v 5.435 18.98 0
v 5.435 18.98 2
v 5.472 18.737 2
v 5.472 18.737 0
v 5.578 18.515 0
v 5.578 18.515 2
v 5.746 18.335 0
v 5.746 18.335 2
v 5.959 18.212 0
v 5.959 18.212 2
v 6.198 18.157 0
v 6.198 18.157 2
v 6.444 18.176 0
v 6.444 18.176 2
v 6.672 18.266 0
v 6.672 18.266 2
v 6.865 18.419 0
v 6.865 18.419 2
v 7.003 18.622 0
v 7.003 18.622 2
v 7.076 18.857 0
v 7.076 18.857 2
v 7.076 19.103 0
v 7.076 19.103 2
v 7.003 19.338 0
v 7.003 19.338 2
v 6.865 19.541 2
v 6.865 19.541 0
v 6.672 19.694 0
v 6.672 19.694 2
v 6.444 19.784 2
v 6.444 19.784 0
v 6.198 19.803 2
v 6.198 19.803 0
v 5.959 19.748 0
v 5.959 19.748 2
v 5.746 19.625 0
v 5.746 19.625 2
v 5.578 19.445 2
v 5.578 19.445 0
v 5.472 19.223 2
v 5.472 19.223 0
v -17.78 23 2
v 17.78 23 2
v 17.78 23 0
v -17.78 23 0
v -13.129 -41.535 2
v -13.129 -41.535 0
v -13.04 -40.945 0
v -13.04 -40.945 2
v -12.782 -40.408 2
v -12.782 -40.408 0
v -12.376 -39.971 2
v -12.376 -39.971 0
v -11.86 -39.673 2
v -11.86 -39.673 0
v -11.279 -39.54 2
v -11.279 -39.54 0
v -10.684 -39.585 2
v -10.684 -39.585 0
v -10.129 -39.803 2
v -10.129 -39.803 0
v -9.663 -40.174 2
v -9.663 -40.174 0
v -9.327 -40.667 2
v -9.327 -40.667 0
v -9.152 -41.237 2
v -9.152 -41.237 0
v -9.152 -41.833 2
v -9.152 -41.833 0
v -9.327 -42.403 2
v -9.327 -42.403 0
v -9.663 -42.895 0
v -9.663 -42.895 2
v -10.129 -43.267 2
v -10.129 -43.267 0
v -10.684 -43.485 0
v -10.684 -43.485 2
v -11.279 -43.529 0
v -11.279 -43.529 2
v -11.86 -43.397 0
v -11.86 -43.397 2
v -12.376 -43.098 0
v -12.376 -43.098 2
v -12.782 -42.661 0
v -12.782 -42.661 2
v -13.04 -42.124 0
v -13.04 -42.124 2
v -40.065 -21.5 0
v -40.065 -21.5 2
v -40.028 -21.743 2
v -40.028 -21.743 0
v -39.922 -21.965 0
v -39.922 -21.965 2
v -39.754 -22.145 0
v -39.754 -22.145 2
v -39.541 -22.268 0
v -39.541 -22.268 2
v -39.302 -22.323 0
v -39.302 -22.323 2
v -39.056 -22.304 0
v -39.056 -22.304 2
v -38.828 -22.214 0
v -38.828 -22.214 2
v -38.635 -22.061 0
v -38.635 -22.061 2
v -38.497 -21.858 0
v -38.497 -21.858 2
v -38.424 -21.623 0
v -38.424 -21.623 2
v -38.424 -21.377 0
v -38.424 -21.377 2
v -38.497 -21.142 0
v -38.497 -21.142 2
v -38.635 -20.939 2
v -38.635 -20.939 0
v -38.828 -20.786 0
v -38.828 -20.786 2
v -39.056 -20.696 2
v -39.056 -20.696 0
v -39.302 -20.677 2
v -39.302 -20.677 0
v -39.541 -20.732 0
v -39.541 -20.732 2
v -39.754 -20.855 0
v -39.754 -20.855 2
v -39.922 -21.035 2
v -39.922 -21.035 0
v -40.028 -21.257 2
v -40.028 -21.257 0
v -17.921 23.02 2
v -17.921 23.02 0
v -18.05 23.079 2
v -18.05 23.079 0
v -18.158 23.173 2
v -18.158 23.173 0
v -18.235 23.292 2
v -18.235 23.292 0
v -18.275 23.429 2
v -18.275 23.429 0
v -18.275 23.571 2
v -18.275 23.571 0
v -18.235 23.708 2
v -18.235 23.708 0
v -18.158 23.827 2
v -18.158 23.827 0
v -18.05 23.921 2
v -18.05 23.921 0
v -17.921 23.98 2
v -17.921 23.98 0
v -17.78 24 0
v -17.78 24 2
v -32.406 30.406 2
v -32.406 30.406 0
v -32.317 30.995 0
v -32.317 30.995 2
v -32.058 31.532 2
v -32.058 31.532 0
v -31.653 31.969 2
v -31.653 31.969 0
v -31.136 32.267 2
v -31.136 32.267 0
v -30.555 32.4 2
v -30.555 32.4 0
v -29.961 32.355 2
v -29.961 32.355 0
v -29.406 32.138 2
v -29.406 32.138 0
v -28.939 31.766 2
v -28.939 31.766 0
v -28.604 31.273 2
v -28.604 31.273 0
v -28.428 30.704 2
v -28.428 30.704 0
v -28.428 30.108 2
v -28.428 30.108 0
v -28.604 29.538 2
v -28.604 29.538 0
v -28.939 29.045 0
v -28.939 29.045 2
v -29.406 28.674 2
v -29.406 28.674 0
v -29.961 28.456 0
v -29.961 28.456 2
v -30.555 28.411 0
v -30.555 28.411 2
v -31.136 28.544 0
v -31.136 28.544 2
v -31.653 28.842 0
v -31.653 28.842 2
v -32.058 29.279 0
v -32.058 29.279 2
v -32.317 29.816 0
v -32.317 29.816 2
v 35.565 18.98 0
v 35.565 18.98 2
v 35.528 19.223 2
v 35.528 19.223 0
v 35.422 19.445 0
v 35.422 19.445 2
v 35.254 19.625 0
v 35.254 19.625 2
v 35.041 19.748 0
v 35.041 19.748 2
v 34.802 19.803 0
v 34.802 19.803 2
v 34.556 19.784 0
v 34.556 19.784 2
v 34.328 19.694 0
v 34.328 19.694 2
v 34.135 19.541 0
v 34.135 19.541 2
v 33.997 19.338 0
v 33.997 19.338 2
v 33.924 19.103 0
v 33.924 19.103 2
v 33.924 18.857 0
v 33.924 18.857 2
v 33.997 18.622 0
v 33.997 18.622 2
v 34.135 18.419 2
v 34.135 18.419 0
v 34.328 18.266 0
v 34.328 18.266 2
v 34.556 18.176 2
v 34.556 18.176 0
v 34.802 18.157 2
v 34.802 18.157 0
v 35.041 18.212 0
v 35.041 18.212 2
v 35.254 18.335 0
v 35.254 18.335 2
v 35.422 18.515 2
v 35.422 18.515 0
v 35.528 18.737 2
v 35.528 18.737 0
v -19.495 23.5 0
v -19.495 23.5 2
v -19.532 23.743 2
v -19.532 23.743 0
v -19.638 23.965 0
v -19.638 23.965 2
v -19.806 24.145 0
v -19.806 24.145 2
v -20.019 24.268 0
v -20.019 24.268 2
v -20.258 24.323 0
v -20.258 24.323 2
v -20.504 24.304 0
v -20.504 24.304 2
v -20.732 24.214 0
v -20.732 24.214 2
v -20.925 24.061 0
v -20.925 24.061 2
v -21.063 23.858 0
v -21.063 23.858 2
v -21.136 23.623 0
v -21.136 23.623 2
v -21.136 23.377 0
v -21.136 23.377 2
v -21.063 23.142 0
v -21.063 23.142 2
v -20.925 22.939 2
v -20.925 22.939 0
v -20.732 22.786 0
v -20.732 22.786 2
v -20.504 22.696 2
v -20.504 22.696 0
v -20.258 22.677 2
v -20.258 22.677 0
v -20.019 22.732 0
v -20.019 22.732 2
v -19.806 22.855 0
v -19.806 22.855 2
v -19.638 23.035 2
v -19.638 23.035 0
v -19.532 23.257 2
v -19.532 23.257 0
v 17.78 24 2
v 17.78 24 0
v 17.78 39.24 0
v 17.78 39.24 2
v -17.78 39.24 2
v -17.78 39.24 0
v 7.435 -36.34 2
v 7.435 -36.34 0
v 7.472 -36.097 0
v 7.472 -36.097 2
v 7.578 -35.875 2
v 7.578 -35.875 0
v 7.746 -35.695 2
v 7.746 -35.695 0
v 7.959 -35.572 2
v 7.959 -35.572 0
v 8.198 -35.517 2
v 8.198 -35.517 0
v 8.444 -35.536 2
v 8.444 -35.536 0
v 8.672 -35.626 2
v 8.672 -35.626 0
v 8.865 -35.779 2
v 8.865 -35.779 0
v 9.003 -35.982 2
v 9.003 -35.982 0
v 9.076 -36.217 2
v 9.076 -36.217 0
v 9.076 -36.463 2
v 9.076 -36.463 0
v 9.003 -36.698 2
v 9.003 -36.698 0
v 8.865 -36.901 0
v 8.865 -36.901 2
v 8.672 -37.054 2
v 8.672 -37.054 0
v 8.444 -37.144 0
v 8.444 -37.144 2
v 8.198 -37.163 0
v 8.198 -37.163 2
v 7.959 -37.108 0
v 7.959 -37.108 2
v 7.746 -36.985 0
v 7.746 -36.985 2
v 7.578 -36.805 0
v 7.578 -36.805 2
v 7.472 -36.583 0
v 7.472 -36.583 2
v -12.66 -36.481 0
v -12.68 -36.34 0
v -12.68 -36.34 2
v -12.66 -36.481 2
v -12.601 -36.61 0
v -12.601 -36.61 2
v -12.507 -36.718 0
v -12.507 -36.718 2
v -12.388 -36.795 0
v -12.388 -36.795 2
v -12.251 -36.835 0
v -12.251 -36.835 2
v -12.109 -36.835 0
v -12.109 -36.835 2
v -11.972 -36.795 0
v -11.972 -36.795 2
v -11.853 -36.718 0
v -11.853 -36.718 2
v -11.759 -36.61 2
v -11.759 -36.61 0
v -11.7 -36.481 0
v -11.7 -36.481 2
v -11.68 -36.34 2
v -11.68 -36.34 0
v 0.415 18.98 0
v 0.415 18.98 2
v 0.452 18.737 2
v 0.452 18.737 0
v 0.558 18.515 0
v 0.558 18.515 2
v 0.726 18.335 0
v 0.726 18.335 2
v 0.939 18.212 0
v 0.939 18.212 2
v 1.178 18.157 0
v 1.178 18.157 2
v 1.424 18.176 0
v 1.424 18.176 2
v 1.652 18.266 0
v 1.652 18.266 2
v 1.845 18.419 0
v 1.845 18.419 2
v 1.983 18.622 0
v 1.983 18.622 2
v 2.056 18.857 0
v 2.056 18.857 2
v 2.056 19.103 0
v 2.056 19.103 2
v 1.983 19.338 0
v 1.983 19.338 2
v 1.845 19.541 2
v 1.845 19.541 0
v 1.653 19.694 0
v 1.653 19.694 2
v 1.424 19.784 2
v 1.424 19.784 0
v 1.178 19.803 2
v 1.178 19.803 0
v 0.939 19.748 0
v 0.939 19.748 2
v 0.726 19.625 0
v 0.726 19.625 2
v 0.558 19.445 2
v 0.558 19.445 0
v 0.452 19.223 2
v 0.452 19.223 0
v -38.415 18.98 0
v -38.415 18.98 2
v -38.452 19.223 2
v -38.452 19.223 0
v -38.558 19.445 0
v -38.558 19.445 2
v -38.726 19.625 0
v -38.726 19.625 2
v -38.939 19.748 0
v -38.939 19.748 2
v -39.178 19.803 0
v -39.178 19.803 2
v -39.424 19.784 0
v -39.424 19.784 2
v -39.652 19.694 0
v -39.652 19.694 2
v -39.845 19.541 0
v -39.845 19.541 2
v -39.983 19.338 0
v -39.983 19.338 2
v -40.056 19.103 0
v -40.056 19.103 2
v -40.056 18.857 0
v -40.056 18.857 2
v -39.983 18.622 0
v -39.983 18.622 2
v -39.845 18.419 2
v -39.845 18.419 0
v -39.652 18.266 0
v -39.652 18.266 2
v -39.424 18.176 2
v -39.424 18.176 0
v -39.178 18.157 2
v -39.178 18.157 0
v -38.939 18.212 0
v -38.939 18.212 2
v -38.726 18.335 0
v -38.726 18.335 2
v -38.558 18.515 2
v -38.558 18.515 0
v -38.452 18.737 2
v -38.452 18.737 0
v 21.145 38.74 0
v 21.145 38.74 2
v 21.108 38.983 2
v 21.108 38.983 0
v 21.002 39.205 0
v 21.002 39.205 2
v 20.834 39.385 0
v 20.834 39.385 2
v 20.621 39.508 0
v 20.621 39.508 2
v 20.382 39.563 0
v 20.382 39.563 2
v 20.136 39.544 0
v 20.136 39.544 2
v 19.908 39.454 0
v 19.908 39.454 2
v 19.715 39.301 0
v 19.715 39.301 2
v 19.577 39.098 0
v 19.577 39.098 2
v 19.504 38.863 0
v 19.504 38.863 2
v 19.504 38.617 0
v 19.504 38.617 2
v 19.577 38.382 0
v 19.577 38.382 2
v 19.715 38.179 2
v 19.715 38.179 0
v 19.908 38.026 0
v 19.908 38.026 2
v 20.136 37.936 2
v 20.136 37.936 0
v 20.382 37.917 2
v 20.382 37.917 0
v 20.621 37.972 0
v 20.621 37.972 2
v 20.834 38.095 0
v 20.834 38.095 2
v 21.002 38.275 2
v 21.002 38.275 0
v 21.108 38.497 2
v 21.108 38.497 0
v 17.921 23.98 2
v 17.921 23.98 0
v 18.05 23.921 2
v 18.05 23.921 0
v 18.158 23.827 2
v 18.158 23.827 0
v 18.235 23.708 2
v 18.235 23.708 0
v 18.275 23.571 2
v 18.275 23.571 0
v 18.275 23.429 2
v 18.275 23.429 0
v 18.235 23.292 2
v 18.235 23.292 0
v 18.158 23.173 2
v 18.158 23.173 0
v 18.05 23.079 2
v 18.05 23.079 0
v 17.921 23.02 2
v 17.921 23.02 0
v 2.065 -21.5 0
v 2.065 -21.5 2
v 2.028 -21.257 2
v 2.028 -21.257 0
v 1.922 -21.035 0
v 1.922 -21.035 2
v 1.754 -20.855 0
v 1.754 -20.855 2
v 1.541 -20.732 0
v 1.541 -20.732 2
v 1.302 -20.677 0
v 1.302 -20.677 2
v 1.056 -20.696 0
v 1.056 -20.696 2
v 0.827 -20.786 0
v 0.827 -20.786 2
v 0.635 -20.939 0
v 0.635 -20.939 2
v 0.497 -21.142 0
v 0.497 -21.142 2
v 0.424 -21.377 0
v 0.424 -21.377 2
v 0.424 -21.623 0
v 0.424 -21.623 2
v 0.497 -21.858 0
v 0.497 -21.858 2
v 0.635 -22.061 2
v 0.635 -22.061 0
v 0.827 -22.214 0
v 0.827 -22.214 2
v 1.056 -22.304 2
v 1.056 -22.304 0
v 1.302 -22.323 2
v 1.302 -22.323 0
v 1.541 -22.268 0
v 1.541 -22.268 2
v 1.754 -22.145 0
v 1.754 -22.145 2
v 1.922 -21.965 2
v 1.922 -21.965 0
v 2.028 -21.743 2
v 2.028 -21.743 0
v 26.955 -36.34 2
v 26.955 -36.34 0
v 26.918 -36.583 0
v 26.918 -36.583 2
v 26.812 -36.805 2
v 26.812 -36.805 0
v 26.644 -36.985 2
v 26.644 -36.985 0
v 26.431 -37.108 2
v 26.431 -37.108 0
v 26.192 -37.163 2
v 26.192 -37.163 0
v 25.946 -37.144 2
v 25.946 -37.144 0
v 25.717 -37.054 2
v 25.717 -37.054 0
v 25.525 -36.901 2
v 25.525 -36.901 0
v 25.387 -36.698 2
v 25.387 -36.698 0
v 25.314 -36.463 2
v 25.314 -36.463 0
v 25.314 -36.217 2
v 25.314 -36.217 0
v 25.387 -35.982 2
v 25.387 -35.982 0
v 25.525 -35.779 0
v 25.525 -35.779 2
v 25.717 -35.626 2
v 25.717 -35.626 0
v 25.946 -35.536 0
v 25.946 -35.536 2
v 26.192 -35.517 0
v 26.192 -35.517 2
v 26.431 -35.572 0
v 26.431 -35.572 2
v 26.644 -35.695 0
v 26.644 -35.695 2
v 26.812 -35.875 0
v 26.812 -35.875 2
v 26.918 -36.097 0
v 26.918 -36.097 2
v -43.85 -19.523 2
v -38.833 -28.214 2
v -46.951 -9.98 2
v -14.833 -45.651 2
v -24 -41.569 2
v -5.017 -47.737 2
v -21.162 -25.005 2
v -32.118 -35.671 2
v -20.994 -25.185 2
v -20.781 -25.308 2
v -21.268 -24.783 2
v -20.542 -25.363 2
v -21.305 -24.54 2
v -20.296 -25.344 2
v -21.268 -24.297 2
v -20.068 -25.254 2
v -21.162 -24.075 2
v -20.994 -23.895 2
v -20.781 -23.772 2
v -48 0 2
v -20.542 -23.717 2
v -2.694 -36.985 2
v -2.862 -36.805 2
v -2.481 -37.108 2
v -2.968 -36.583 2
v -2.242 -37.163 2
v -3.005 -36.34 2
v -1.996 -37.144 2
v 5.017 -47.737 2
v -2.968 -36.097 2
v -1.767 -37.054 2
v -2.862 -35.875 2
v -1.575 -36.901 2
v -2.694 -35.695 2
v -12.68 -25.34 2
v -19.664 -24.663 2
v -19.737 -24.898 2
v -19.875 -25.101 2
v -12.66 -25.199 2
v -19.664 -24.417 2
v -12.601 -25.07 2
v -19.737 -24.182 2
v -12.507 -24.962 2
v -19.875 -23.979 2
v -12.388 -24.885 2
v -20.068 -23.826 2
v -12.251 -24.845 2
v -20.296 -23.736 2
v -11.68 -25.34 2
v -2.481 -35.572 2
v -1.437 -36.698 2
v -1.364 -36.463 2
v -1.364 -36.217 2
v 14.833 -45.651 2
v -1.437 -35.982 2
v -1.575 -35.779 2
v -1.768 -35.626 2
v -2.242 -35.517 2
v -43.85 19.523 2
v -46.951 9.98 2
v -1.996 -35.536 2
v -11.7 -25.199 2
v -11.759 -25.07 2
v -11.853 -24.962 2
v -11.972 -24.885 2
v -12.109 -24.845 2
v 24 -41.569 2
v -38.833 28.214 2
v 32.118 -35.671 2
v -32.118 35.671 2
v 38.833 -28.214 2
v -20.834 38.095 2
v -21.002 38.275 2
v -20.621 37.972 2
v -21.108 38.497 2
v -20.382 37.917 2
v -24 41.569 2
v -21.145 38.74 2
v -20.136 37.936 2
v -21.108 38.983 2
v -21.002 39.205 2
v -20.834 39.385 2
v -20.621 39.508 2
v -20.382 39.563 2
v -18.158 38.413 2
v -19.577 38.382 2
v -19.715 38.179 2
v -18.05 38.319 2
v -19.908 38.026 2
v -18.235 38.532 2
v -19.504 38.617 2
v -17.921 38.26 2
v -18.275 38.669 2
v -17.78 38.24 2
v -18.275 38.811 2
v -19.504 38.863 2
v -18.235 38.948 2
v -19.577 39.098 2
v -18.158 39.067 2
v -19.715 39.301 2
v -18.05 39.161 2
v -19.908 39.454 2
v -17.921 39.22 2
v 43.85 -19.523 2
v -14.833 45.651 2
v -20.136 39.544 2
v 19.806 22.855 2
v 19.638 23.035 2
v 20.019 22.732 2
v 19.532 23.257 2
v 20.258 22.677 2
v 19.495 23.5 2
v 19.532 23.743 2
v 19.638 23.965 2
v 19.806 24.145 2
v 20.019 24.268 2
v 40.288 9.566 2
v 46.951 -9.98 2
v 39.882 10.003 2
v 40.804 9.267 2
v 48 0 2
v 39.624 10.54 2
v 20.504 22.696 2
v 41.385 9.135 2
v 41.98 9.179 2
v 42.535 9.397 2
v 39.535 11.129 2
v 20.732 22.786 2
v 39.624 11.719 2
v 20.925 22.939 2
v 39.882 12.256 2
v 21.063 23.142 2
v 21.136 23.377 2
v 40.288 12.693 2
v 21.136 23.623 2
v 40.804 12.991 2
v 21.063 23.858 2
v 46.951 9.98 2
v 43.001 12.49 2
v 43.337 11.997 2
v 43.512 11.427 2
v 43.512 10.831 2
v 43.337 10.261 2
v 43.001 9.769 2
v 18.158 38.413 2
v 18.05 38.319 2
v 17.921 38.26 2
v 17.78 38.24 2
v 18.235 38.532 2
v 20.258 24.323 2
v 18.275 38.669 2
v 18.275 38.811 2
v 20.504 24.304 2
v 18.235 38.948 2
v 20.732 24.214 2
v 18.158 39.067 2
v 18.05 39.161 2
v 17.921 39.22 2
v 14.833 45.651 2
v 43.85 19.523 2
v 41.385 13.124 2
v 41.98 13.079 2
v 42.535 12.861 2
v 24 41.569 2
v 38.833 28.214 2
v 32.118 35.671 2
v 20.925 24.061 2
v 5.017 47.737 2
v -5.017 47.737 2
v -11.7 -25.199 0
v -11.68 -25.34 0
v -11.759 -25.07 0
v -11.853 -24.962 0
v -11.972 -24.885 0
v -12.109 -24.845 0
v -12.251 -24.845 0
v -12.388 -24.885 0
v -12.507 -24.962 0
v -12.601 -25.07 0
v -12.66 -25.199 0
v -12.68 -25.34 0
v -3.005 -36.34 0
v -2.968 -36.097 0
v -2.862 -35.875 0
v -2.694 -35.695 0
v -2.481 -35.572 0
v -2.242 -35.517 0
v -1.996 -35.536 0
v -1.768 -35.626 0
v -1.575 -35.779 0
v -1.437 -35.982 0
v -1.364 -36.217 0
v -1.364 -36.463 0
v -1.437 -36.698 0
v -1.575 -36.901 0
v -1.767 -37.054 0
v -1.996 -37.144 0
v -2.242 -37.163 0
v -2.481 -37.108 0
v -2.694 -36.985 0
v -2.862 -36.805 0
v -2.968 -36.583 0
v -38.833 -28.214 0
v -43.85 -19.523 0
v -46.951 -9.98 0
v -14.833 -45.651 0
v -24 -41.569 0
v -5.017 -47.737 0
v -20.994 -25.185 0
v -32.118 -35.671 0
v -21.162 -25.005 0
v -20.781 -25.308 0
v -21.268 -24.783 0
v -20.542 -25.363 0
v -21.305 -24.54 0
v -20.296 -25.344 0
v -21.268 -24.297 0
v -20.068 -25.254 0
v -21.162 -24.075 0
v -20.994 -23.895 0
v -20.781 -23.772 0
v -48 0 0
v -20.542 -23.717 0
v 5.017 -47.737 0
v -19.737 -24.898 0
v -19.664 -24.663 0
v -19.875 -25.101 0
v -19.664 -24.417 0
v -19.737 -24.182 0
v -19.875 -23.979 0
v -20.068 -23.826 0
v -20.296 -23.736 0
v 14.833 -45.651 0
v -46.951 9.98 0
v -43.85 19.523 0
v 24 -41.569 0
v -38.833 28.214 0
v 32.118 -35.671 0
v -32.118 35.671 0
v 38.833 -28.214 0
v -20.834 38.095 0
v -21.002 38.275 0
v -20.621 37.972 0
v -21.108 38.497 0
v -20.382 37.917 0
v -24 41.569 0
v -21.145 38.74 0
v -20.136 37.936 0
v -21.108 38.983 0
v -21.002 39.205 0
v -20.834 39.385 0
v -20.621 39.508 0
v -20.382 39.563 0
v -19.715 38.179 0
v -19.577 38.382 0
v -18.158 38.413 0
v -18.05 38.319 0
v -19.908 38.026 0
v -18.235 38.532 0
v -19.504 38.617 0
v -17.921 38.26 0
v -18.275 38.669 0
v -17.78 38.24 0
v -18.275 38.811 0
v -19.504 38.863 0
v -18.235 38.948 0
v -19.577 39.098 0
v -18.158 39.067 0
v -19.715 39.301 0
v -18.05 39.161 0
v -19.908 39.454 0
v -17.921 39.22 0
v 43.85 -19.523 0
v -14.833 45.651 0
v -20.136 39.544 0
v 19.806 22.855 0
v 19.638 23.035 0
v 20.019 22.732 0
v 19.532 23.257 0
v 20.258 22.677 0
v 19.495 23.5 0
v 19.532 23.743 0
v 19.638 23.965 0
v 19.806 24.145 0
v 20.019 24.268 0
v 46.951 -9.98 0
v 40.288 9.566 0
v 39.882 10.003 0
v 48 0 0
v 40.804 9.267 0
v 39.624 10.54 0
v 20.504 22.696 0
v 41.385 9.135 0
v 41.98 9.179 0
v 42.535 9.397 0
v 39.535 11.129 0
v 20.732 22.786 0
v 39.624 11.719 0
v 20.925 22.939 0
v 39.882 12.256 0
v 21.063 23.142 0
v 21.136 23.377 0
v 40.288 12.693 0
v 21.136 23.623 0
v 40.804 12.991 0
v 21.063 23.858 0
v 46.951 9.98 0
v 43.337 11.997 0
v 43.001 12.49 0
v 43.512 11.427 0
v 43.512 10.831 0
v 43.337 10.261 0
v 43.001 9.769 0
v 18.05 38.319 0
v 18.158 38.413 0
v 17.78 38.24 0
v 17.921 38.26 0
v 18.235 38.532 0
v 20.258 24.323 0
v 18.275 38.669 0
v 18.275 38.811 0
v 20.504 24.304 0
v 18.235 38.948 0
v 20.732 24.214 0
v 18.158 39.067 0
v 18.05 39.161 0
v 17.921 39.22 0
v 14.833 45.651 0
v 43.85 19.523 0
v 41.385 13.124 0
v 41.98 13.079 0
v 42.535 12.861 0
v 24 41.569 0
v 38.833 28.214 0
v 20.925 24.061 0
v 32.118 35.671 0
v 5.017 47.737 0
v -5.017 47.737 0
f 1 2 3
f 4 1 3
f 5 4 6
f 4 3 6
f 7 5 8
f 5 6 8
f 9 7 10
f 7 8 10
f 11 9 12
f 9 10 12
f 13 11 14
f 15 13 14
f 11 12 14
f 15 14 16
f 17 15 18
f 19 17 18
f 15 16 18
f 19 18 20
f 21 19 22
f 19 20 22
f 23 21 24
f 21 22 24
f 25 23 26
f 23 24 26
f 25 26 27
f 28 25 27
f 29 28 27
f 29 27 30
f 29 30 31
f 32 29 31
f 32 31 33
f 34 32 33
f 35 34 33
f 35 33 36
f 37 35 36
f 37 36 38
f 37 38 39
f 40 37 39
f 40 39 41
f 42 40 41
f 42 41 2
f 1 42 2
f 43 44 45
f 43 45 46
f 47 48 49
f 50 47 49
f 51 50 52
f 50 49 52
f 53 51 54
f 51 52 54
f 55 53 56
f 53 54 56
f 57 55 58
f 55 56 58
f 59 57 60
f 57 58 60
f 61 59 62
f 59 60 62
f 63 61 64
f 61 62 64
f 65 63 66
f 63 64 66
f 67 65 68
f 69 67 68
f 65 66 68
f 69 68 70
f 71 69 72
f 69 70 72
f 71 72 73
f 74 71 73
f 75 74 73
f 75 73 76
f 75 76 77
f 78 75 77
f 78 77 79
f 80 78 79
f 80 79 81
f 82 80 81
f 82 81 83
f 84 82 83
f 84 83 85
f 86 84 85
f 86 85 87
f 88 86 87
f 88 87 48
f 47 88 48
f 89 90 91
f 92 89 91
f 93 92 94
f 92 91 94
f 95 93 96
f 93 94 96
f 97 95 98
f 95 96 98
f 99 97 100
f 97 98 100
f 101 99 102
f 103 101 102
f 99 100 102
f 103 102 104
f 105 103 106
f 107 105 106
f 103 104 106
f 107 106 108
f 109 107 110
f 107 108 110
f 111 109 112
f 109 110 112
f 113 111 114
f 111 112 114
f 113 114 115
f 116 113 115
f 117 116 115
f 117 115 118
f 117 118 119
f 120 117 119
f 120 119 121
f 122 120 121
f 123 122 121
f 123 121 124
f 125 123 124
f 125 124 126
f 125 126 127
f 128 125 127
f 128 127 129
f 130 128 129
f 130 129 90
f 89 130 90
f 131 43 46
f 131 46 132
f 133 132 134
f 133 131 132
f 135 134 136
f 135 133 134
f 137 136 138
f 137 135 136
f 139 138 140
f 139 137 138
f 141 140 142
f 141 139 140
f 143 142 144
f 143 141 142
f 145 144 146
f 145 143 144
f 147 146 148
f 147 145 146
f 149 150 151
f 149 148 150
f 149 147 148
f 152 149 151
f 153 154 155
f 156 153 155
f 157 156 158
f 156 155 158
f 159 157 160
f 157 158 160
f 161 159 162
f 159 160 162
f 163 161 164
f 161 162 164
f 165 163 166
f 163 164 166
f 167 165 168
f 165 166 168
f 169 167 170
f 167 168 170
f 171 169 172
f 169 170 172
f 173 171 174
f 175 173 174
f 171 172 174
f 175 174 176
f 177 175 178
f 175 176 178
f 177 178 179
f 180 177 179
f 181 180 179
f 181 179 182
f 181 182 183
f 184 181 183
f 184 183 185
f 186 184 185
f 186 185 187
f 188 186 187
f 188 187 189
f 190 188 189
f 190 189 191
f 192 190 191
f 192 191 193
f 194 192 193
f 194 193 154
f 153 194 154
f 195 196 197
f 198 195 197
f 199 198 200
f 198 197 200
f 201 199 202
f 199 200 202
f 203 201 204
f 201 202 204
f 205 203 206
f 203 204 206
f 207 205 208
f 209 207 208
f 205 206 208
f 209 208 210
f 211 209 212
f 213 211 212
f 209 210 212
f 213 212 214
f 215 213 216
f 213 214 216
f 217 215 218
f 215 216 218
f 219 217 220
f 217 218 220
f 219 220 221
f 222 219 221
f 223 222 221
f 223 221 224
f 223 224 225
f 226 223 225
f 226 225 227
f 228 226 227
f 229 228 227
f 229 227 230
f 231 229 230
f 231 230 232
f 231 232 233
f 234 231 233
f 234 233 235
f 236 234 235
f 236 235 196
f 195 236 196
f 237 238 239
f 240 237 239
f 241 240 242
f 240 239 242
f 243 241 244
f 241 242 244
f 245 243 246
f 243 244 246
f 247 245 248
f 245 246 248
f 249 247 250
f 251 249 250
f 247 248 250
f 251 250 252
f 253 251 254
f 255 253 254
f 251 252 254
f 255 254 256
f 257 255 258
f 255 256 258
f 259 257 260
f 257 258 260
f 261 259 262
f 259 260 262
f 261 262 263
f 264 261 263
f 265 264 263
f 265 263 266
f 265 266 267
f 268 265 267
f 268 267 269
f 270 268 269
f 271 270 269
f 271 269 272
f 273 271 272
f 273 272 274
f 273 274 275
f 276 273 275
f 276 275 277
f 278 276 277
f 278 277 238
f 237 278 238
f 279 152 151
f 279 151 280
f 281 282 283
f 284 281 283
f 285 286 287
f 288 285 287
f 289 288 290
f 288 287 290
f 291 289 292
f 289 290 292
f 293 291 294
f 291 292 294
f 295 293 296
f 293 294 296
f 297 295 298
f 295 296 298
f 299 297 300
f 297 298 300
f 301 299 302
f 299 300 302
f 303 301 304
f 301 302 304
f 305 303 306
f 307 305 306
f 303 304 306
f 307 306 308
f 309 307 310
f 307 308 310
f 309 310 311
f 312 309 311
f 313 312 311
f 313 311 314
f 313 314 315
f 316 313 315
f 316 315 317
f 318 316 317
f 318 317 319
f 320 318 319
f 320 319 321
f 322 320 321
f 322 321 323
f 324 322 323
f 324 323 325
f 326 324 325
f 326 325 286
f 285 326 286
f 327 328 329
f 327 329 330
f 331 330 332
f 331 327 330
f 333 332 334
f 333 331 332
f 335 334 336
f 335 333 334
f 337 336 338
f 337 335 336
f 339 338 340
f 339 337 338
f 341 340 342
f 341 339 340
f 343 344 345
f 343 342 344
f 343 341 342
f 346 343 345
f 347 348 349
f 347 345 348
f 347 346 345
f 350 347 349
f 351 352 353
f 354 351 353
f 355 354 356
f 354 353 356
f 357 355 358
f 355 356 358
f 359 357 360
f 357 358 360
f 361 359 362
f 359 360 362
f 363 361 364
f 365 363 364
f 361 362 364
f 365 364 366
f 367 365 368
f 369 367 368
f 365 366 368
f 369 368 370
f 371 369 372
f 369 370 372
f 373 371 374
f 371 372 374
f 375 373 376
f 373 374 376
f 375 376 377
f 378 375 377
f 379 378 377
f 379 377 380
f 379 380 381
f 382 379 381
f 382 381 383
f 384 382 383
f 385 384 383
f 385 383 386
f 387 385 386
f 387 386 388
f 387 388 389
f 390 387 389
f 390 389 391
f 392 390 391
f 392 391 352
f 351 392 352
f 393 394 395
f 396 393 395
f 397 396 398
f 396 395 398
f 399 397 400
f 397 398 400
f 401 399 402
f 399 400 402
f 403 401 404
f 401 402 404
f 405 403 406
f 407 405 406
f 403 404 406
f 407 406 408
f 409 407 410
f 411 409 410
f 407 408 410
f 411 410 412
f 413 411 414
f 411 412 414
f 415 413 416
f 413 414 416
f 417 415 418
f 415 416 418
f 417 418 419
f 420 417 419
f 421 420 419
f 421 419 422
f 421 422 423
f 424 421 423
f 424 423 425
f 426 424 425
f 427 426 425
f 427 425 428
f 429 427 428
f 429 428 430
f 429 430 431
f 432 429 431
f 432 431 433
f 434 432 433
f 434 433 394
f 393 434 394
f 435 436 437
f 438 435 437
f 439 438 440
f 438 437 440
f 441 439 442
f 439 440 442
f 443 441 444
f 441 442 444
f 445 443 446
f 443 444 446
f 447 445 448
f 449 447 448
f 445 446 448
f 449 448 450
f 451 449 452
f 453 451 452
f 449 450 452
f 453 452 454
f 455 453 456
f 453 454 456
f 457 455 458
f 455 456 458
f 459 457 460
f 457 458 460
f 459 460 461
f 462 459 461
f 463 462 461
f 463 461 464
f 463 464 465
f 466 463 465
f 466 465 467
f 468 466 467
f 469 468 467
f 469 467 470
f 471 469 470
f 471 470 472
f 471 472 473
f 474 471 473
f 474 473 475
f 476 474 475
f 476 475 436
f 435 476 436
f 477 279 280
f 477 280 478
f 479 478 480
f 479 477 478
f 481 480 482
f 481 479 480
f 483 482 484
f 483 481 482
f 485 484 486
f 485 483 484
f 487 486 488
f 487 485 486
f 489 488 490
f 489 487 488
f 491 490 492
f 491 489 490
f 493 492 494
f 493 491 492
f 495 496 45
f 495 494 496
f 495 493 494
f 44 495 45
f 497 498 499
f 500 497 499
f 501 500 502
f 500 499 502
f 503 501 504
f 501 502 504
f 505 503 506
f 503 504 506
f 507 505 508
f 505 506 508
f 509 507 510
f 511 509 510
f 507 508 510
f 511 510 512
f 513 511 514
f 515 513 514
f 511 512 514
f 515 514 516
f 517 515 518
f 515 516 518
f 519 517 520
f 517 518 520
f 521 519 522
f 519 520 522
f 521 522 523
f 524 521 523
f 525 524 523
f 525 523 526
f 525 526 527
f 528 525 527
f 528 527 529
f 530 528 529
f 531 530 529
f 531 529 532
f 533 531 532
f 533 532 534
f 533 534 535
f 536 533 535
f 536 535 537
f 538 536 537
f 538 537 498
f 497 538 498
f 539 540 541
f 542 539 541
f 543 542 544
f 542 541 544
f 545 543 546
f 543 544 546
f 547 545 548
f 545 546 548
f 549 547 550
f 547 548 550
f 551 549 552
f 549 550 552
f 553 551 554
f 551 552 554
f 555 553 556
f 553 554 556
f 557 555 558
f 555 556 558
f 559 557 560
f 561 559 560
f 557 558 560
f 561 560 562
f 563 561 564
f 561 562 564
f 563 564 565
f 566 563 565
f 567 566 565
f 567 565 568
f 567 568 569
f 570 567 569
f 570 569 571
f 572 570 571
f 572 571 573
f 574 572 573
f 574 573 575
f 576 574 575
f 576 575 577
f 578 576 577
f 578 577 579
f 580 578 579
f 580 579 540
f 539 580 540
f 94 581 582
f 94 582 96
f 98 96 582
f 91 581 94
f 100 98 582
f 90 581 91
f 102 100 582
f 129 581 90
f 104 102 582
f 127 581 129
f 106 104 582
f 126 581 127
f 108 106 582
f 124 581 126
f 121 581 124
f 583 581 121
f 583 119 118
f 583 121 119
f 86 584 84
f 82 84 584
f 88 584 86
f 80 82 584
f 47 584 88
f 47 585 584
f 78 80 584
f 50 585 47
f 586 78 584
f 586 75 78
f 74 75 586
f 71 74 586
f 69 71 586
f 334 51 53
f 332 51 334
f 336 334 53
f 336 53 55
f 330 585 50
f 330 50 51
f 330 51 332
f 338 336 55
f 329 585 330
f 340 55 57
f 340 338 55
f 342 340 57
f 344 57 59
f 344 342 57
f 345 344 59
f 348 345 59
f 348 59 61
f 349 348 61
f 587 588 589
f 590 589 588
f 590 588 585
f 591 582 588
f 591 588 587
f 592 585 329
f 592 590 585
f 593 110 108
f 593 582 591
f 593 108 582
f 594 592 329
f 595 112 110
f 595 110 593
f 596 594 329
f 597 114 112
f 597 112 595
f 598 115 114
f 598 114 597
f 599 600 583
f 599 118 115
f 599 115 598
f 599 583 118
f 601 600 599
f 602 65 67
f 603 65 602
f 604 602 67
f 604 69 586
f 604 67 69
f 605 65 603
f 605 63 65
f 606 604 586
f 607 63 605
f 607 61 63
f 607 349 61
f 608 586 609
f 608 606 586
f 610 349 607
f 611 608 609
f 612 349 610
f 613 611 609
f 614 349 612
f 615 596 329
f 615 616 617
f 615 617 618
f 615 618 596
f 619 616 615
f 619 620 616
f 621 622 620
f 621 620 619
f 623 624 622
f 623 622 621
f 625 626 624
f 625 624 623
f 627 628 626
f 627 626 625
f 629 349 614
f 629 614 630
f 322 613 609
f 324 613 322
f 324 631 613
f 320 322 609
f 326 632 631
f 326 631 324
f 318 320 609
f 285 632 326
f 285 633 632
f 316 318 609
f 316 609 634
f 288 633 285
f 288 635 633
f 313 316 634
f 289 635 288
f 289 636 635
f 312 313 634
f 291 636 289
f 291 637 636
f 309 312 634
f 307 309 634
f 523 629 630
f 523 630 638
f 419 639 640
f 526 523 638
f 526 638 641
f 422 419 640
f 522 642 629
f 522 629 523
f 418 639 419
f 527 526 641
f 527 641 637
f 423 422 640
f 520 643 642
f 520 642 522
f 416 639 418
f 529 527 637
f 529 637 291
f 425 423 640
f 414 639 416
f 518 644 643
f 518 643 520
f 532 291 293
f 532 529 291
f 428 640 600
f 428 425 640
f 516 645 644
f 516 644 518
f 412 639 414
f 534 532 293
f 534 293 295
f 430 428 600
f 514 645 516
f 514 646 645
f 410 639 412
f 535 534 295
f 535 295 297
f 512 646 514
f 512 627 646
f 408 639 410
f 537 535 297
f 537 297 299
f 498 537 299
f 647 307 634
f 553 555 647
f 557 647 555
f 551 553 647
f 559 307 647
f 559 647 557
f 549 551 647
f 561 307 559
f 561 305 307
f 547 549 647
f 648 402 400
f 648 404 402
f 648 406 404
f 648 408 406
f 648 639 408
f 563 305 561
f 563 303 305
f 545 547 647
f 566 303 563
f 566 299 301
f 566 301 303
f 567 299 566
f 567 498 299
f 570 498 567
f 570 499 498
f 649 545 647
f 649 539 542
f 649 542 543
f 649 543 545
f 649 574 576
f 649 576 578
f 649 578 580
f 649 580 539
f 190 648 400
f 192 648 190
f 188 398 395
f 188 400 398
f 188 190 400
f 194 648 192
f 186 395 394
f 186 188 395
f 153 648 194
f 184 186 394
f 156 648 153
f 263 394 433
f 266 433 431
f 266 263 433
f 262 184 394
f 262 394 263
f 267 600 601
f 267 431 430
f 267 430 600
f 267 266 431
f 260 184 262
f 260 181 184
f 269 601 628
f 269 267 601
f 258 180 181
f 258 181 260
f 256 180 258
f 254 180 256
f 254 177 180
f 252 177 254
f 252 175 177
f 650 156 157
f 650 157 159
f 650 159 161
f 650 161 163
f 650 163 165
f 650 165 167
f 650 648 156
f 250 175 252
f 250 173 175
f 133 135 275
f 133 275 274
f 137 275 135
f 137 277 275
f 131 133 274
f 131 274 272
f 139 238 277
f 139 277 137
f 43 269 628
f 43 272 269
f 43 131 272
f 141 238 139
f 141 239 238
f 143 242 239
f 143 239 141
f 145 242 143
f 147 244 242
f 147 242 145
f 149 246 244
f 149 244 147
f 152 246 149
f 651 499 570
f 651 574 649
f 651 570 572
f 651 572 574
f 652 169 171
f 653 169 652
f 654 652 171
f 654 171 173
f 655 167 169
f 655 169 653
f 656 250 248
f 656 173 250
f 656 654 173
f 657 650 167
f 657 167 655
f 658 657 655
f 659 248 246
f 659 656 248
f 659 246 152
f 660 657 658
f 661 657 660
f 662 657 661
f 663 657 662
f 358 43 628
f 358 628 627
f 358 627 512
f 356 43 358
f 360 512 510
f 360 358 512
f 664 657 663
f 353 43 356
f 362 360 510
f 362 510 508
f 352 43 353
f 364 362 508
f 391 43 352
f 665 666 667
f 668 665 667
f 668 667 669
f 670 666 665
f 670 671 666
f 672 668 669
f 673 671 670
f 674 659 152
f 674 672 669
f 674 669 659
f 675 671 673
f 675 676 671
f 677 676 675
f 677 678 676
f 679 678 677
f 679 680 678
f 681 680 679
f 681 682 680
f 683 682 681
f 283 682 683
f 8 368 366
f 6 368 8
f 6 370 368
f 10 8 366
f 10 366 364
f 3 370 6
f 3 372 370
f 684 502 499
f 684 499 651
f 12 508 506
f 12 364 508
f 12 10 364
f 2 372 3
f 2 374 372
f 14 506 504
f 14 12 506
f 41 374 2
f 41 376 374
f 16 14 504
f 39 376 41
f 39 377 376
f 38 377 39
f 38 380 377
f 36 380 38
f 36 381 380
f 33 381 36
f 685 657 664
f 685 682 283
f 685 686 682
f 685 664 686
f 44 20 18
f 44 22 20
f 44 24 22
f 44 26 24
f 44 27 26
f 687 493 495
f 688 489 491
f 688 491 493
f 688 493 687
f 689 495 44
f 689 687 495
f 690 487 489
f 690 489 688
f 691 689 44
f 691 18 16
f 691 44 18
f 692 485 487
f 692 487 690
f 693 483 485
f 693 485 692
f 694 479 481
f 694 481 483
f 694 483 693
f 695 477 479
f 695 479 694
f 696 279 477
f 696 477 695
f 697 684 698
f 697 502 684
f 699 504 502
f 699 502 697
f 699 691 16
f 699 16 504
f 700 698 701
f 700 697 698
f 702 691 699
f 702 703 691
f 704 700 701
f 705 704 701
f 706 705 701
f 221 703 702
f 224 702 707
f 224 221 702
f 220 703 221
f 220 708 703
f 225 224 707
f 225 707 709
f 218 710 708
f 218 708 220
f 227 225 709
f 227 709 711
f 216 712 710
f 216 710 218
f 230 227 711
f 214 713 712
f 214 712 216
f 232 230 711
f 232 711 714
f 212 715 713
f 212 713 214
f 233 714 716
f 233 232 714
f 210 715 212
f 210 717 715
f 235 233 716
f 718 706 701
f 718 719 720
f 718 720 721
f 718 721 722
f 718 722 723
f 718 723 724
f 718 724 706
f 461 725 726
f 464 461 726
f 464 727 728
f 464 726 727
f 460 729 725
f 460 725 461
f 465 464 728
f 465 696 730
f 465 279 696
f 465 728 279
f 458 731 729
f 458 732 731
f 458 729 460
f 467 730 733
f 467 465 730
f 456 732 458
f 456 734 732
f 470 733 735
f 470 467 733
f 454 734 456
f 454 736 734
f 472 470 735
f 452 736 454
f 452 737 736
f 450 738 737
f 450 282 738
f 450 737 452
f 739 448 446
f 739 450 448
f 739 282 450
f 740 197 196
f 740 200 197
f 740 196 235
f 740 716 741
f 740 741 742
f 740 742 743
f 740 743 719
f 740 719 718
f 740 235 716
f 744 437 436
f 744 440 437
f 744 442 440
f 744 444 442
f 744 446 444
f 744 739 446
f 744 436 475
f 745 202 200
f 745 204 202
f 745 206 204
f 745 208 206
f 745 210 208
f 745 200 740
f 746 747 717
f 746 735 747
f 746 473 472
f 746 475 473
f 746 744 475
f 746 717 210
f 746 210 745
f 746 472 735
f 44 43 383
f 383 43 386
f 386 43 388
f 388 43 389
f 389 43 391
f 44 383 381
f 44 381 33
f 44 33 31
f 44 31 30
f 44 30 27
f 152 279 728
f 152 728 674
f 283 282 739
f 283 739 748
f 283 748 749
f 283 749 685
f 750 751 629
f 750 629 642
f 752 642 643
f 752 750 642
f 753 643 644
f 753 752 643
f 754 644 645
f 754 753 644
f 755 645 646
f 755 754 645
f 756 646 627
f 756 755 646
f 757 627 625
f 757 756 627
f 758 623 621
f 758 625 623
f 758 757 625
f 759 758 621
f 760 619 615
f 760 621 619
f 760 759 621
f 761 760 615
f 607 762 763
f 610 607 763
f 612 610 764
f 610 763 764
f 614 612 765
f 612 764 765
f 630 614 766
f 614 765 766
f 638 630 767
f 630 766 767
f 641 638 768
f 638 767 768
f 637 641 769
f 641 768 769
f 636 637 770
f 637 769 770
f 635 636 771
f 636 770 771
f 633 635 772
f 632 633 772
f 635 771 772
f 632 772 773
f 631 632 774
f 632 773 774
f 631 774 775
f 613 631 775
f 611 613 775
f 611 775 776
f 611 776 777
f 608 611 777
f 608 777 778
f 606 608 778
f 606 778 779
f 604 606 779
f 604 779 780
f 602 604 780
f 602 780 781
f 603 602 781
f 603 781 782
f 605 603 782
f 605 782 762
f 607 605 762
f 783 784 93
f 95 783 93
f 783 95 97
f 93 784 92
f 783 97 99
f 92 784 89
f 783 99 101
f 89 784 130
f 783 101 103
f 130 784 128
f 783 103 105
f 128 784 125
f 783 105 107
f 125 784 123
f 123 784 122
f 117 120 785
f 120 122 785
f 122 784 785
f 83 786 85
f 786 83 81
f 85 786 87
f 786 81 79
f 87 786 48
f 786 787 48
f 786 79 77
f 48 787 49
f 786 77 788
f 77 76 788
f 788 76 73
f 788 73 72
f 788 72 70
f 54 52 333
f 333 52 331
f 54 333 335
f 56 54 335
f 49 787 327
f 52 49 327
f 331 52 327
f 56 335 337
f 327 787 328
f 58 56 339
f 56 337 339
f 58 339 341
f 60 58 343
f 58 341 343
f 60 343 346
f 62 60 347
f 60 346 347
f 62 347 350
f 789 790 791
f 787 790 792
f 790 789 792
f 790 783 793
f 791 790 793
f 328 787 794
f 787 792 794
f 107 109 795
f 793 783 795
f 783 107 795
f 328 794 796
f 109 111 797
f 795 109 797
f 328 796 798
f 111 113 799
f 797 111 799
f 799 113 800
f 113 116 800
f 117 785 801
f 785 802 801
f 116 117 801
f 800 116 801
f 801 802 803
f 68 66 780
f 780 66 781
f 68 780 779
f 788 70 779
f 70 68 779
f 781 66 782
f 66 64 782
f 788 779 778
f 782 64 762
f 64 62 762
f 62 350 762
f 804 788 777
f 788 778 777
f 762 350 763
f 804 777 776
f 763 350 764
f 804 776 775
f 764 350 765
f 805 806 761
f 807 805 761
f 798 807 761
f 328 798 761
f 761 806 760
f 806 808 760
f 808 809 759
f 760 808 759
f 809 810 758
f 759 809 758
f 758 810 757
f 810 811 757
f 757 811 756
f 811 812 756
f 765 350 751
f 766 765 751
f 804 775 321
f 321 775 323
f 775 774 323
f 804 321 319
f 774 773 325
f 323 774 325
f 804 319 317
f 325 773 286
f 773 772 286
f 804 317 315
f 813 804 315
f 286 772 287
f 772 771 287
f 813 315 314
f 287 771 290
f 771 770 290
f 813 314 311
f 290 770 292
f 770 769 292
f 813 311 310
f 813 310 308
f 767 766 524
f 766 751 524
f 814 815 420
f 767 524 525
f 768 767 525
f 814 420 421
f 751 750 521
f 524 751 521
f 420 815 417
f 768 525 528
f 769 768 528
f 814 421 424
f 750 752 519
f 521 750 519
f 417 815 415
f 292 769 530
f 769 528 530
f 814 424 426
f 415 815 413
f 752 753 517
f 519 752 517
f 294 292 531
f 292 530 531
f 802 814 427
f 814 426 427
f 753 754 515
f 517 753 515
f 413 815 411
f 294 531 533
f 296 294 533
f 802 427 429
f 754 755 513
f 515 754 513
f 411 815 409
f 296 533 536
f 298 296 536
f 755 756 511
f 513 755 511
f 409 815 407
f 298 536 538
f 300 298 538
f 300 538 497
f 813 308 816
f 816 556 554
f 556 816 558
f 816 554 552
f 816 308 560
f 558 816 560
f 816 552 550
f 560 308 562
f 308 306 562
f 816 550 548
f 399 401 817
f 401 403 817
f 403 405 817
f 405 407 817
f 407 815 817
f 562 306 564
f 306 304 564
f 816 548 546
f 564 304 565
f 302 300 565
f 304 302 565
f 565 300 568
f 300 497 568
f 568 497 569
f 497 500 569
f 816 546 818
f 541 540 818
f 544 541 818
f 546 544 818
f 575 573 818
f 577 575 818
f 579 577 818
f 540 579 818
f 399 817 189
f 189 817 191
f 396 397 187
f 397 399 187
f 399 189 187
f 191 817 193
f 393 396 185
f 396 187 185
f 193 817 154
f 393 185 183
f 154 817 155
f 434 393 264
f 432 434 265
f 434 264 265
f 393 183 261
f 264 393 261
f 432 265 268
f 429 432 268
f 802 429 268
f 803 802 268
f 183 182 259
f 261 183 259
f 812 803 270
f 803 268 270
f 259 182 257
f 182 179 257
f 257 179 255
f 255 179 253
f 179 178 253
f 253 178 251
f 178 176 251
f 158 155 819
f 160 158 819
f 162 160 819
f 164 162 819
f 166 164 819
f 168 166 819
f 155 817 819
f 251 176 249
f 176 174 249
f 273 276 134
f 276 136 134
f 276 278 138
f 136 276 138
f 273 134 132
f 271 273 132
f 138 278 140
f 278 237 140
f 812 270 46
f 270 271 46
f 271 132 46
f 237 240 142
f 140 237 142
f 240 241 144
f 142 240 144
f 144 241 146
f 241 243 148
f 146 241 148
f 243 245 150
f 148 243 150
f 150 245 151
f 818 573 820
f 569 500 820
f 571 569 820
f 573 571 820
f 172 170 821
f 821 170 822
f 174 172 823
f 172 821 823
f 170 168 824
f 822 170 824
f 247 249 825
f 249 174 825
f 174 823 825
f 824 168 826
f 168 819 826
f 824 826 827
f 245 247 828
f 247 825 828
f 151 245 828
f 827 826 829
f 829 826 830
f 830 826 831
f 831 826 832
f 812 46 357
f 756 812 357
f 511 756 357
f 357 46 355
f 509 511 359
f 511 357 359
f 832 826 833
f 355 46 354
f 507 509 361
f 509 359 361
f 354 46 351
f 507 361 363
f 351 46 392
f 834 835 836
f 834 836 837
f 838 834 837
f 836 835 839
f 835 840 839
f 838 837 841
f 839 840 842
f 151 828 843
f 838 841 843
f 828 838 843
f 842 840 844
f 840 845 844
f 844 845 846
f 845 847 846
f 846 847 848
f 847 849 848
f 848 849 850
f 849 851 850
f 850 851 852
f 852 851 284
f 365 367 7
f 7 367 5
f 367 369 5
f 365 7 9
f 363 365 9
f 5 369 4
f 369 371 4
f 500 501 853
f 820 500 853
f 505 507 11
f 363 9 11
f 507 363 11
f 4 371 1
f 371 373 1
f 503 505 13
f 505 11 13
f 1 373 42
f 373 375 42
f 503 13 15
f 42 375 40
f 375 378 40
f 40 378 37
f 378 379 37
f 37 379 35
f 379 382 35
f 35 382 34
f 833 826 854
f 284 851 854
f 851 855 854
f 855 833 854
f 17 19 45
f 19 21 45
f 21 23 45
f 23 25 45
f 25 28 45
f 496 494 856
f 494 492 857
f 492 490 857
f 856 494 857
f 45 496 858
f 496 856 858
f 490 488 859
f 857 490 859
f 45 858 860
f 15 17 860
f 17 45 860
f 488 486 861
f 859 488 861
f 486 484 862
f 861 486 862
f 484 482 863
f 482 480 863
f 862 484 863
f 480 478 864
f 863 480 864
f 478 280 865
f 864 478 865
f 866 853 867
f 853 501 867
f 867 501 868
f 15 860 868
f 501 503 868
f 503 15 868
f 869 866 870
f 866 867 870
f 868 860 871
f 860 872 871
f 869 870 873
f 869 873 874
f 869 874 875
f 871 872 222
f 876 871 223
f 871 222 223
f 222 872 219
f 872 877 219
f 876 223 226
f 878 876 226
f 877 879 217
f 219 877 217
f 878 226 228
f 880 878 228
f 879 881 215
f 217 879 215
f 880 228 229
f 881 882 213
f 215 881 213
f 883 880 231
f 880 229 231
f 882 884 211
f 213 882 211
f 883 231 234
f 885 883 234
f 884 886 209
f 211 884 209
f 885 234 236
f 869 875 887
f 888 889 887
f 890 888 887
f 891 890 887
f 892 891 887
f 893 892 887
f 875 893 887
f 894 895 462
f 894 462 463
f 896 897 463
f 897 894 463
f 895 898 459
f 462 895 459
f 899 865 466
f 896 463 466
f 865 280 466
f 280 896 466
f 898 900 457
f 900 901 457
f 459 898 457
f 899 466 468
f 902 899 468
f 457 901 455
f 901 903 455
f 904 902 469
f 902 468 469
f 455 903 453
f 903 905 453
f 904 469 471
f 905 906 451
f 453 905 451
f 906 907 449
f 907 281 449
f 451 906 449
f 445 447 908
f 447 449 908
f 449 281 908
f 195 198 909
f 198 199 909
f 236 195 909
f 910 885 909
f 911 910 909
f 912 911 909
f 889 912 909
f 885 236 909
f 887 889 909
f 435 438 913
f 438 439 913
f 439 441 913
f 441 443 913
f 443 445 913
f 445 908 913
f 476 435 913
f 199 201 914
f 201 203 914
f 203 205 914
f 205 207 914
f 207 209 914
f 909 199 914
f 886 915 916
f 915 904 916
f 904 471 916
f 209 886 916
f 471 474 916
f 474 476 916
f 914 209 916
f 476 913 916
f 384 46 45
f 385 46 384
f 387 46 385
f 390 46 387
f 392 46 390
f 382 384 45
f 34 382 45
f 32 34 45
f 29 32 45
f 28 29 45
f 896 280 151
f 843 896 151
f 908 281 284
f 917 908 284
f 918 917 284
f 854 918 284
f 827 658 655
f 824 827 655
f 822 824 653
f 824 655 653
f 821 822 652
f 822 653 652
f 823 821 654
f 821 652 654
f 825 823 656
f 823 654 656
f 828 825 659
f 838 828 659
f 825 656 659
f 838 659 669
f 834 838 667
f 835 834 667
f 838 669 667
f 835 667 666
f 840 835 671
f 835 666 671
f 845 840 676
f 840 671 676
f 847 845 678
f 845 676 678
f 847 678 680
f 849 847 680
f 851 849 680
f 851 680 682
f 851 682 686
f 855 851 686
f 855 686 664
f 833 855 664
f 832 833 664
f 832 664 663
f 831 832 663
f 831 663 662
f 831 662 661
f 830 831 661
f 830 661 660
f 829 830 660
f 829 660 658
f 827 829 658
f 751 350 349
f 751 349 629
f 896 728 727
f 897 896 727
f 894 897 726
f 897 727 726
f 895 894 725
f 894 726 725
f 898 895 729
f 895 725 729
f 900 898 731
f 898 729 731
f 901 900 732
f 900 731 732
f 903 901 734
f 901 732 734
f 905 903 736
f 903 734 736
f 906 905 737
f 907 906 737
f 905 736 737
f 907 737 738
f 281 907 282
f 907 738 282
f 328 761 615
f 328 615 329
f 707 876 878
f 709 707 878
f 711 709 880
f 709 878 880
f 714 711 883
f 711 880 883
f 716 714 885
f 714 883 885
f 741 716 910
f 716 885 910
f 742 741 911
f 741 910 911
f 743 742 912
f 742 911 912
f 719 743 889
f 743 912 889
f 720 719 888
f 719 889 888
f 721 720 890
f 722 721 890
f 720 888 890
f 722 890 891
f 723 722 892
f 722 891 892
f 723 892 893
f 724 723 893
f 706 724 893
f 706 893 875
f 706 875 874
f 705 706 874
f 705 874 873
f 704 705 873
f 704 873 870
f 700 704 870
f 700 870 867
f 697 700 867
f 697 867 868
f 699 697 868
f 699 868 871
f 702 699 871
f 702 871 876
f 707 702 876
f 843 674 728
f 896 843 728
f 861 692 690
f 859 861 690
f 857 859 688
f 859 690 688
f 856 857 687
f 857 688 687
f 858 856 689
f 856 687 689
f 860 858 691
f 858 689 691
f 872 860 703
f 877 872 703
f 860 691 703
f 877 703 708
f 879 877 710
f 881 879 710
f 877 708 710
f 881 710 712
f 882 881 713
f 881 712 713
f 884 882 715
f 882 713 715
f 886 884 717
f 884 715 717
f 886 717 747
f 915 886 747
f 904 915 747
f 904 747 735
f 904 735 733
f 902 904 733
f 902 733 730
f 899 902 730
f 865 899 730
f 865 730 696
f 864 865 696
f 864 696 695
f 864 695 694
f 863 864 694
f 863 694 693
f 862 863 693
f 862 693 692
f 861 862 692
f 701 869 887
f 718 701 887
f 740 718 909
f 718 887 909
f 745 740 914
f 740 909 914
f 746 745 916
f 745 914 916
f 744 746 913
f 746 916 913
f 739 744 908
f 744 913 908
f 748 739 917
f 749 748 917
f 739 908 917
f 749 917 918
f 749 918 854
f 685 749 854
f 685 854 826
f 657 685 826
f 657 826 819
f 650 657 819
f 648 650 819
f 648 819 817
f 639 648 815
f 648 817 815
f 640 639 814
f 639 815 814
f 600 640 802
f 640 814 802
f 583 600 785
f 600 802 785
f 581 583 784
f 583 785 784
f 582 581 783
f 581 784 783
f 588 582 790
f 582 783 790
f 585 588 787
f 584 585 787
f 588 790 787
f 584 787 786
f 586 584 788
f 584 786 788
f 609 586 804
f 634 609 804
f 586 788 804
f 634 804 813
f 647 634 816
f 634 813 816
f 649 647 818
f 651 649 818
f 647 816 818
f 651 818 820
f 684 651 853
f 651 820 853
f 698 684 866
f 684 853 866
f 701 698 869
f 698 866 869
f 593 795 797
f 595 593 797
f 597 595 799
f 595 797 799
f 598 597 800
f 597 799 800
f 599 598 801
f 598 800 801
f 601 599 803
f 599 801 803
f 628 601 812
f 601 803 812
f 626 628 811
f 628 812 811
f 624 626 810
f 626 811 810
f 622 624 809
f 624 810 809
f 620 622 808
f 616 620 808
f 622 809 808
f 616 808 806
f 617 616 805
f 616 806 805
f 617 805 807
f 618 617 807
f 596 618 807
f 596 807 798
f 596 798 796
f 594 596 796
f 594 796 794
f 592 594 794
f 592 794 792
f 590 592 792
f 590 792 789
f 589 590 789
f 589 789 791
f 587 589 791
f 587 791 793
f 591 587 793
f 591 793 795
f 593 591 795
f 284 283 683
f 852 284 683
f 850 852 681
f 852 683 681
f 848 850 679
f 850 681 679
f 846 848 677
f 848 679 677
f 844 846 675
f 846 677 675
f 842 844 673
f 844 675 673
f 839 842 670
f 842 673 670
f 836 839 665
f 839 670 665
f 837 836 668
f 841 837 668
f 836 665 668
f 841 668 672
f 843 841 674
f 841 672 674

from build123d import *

# Parameters (mm, degrees)
SKETCH1_R                    = 48
BOSS_EXTRUDE1_DEPTH          = 2
SKETCH3_R                    = 2
CUT_EXTRUDE1_DEPTH           = 68.911707385
SKETCH2_R                    = 0.825
CUT_EXTRUDE_NANO_RECTO_DEPTH = 68.911707385
SKETCH4_R                    = 0.825
CUT_EXTRUDE_VERSO_DEPTH      = 68.911707385


with BuildPart() as part:
    # Sketch1 → Boss-Extrude1 (new body)
    with BuildSketch(Plane.XY):
        Circle(SKETCH1_R)
    extrude(amount=BOSS_EXTRUDE1_DEPTH)

    # Sketch3 → Cut-Extrude1 (cut, through all)
    with BuildSketch(Plane(origin=(0, 0, 0), x_dir=(-1, 0, 0), z_dir=(0, 0, -1))):
        with Locations((30.405591591, 30.405591591)):
            Circle(SKETCH3_R)
        with Locations((11.129218939, -41.53481053)):
            Circle(SKETCH3_R)
        with Locations((-41.53481053, 11.129218939)):
            Circle(SKETCH3_R)
    extrude(amount=-CUT_EXTRUDE1_DEPTH, mode=Mode.SUBTRACT)

    # Sketch2 → Cut-Extrude-Nano+Recto (cut, through all)
    with BuildSketch(Plane.XY.offset(2)):
        with Locations((20.32, 38.74)):
            Circle(SKETCH2_R)
        with Locations(Location((20.32, 23.5, 0), (0, 0, 180))):
            Circle(SKETCH2_R)
        with Locations((-20.32, 23.5)):
            Circle(SKETCH2_R)
        with Locations(Location((-20.32, 38.74, 0), (0, 0, 180))):
            Circle(SKETCH2_R)
        with Locations((34.74, 18.98)):
            Circle(SKETCH2_R)
        with Locations(Location((6.26, 18.98, 0), (0, 0, 180))):
            Circle(SKETCH2_R)
        with Locations((-39.24, 18.98)):
            Circle(SKETCH2_R)
        with Locations(Location((1.24, 18.98, 0), (0, 0, 180))):
            Circle(SKETCH2_R)
        with Locations((1.24, -21.5)):
            Circle(SKETCH2_R)
        with Locations(Location((-39.24, -21.5, 0), (0, 0, 180))):
            Circle(SKETCH2_R)
        with BuildLine():
            Line((17.78, 23), (-17.78, 23))
            ThreePointArc((-17.78, 23), (-18.28, 23.5), (-17.78, 24))
            Line((-17.78, 24), (17.78, 24))
            ThreePointArc((17.78, 24), (18.28, 23.5), (17.78, 23))
        make_face()
        with BuildLine():
            Line((17.78, 39.24), (-17.78, 39.24))
            ThreePointArc((-17.78, 39.24), (-18.28, 38.74), (-17.78, 38.24))
            Line((-17.78, 38.24), (17.78, 38.24))
            ThreePointArc((17.78, 38.24), (18.28, 38.74), (17.78, 39.24))
        make_face()
    extrude(amount=-CUT_EXTRUDE_NANO_RECTO_DEPTH, mode=Mode.SUBTRACT)

    # Sketch4 → Cut-Extrude-Verso (cut, through all)
    with BuildSketch(Plane(origin=(0, 0, 0), x_dir=(-1, 0, 0), z_dir=(0, 0, -1))):
        with Locations((-8.26, -36.34)):
            Circle(SKETCH4_R)
        with Locations((2.18, -36.34)):
            Circle(SKETCH4_R)
        with Locations(Location((-26.13, -36.34, 0), (0, 0, 180))):
            Circle(SKETCH4_R)
        with Locations((20.48, -24.54)):
            Circle(SKETCH4_R)
        with BuildLine():
            Line((11.68, -36.34), (11.68, -25.34))
            ThreePointArc((11.68, -25.34), (12.18, -24.84), (12.68, -25.34))
            Line((12.68, -25.34), (12.68, -36.34))
            ThreePointArc((12.68, -36.34), (12.18, -36.84), (11.68, -36.34))
        make_face()
    extrude(amount=-CUT_EXTRUDE_VERSO_DEPTH, mode=Mode.SUBTRACT)


solid = part.part
